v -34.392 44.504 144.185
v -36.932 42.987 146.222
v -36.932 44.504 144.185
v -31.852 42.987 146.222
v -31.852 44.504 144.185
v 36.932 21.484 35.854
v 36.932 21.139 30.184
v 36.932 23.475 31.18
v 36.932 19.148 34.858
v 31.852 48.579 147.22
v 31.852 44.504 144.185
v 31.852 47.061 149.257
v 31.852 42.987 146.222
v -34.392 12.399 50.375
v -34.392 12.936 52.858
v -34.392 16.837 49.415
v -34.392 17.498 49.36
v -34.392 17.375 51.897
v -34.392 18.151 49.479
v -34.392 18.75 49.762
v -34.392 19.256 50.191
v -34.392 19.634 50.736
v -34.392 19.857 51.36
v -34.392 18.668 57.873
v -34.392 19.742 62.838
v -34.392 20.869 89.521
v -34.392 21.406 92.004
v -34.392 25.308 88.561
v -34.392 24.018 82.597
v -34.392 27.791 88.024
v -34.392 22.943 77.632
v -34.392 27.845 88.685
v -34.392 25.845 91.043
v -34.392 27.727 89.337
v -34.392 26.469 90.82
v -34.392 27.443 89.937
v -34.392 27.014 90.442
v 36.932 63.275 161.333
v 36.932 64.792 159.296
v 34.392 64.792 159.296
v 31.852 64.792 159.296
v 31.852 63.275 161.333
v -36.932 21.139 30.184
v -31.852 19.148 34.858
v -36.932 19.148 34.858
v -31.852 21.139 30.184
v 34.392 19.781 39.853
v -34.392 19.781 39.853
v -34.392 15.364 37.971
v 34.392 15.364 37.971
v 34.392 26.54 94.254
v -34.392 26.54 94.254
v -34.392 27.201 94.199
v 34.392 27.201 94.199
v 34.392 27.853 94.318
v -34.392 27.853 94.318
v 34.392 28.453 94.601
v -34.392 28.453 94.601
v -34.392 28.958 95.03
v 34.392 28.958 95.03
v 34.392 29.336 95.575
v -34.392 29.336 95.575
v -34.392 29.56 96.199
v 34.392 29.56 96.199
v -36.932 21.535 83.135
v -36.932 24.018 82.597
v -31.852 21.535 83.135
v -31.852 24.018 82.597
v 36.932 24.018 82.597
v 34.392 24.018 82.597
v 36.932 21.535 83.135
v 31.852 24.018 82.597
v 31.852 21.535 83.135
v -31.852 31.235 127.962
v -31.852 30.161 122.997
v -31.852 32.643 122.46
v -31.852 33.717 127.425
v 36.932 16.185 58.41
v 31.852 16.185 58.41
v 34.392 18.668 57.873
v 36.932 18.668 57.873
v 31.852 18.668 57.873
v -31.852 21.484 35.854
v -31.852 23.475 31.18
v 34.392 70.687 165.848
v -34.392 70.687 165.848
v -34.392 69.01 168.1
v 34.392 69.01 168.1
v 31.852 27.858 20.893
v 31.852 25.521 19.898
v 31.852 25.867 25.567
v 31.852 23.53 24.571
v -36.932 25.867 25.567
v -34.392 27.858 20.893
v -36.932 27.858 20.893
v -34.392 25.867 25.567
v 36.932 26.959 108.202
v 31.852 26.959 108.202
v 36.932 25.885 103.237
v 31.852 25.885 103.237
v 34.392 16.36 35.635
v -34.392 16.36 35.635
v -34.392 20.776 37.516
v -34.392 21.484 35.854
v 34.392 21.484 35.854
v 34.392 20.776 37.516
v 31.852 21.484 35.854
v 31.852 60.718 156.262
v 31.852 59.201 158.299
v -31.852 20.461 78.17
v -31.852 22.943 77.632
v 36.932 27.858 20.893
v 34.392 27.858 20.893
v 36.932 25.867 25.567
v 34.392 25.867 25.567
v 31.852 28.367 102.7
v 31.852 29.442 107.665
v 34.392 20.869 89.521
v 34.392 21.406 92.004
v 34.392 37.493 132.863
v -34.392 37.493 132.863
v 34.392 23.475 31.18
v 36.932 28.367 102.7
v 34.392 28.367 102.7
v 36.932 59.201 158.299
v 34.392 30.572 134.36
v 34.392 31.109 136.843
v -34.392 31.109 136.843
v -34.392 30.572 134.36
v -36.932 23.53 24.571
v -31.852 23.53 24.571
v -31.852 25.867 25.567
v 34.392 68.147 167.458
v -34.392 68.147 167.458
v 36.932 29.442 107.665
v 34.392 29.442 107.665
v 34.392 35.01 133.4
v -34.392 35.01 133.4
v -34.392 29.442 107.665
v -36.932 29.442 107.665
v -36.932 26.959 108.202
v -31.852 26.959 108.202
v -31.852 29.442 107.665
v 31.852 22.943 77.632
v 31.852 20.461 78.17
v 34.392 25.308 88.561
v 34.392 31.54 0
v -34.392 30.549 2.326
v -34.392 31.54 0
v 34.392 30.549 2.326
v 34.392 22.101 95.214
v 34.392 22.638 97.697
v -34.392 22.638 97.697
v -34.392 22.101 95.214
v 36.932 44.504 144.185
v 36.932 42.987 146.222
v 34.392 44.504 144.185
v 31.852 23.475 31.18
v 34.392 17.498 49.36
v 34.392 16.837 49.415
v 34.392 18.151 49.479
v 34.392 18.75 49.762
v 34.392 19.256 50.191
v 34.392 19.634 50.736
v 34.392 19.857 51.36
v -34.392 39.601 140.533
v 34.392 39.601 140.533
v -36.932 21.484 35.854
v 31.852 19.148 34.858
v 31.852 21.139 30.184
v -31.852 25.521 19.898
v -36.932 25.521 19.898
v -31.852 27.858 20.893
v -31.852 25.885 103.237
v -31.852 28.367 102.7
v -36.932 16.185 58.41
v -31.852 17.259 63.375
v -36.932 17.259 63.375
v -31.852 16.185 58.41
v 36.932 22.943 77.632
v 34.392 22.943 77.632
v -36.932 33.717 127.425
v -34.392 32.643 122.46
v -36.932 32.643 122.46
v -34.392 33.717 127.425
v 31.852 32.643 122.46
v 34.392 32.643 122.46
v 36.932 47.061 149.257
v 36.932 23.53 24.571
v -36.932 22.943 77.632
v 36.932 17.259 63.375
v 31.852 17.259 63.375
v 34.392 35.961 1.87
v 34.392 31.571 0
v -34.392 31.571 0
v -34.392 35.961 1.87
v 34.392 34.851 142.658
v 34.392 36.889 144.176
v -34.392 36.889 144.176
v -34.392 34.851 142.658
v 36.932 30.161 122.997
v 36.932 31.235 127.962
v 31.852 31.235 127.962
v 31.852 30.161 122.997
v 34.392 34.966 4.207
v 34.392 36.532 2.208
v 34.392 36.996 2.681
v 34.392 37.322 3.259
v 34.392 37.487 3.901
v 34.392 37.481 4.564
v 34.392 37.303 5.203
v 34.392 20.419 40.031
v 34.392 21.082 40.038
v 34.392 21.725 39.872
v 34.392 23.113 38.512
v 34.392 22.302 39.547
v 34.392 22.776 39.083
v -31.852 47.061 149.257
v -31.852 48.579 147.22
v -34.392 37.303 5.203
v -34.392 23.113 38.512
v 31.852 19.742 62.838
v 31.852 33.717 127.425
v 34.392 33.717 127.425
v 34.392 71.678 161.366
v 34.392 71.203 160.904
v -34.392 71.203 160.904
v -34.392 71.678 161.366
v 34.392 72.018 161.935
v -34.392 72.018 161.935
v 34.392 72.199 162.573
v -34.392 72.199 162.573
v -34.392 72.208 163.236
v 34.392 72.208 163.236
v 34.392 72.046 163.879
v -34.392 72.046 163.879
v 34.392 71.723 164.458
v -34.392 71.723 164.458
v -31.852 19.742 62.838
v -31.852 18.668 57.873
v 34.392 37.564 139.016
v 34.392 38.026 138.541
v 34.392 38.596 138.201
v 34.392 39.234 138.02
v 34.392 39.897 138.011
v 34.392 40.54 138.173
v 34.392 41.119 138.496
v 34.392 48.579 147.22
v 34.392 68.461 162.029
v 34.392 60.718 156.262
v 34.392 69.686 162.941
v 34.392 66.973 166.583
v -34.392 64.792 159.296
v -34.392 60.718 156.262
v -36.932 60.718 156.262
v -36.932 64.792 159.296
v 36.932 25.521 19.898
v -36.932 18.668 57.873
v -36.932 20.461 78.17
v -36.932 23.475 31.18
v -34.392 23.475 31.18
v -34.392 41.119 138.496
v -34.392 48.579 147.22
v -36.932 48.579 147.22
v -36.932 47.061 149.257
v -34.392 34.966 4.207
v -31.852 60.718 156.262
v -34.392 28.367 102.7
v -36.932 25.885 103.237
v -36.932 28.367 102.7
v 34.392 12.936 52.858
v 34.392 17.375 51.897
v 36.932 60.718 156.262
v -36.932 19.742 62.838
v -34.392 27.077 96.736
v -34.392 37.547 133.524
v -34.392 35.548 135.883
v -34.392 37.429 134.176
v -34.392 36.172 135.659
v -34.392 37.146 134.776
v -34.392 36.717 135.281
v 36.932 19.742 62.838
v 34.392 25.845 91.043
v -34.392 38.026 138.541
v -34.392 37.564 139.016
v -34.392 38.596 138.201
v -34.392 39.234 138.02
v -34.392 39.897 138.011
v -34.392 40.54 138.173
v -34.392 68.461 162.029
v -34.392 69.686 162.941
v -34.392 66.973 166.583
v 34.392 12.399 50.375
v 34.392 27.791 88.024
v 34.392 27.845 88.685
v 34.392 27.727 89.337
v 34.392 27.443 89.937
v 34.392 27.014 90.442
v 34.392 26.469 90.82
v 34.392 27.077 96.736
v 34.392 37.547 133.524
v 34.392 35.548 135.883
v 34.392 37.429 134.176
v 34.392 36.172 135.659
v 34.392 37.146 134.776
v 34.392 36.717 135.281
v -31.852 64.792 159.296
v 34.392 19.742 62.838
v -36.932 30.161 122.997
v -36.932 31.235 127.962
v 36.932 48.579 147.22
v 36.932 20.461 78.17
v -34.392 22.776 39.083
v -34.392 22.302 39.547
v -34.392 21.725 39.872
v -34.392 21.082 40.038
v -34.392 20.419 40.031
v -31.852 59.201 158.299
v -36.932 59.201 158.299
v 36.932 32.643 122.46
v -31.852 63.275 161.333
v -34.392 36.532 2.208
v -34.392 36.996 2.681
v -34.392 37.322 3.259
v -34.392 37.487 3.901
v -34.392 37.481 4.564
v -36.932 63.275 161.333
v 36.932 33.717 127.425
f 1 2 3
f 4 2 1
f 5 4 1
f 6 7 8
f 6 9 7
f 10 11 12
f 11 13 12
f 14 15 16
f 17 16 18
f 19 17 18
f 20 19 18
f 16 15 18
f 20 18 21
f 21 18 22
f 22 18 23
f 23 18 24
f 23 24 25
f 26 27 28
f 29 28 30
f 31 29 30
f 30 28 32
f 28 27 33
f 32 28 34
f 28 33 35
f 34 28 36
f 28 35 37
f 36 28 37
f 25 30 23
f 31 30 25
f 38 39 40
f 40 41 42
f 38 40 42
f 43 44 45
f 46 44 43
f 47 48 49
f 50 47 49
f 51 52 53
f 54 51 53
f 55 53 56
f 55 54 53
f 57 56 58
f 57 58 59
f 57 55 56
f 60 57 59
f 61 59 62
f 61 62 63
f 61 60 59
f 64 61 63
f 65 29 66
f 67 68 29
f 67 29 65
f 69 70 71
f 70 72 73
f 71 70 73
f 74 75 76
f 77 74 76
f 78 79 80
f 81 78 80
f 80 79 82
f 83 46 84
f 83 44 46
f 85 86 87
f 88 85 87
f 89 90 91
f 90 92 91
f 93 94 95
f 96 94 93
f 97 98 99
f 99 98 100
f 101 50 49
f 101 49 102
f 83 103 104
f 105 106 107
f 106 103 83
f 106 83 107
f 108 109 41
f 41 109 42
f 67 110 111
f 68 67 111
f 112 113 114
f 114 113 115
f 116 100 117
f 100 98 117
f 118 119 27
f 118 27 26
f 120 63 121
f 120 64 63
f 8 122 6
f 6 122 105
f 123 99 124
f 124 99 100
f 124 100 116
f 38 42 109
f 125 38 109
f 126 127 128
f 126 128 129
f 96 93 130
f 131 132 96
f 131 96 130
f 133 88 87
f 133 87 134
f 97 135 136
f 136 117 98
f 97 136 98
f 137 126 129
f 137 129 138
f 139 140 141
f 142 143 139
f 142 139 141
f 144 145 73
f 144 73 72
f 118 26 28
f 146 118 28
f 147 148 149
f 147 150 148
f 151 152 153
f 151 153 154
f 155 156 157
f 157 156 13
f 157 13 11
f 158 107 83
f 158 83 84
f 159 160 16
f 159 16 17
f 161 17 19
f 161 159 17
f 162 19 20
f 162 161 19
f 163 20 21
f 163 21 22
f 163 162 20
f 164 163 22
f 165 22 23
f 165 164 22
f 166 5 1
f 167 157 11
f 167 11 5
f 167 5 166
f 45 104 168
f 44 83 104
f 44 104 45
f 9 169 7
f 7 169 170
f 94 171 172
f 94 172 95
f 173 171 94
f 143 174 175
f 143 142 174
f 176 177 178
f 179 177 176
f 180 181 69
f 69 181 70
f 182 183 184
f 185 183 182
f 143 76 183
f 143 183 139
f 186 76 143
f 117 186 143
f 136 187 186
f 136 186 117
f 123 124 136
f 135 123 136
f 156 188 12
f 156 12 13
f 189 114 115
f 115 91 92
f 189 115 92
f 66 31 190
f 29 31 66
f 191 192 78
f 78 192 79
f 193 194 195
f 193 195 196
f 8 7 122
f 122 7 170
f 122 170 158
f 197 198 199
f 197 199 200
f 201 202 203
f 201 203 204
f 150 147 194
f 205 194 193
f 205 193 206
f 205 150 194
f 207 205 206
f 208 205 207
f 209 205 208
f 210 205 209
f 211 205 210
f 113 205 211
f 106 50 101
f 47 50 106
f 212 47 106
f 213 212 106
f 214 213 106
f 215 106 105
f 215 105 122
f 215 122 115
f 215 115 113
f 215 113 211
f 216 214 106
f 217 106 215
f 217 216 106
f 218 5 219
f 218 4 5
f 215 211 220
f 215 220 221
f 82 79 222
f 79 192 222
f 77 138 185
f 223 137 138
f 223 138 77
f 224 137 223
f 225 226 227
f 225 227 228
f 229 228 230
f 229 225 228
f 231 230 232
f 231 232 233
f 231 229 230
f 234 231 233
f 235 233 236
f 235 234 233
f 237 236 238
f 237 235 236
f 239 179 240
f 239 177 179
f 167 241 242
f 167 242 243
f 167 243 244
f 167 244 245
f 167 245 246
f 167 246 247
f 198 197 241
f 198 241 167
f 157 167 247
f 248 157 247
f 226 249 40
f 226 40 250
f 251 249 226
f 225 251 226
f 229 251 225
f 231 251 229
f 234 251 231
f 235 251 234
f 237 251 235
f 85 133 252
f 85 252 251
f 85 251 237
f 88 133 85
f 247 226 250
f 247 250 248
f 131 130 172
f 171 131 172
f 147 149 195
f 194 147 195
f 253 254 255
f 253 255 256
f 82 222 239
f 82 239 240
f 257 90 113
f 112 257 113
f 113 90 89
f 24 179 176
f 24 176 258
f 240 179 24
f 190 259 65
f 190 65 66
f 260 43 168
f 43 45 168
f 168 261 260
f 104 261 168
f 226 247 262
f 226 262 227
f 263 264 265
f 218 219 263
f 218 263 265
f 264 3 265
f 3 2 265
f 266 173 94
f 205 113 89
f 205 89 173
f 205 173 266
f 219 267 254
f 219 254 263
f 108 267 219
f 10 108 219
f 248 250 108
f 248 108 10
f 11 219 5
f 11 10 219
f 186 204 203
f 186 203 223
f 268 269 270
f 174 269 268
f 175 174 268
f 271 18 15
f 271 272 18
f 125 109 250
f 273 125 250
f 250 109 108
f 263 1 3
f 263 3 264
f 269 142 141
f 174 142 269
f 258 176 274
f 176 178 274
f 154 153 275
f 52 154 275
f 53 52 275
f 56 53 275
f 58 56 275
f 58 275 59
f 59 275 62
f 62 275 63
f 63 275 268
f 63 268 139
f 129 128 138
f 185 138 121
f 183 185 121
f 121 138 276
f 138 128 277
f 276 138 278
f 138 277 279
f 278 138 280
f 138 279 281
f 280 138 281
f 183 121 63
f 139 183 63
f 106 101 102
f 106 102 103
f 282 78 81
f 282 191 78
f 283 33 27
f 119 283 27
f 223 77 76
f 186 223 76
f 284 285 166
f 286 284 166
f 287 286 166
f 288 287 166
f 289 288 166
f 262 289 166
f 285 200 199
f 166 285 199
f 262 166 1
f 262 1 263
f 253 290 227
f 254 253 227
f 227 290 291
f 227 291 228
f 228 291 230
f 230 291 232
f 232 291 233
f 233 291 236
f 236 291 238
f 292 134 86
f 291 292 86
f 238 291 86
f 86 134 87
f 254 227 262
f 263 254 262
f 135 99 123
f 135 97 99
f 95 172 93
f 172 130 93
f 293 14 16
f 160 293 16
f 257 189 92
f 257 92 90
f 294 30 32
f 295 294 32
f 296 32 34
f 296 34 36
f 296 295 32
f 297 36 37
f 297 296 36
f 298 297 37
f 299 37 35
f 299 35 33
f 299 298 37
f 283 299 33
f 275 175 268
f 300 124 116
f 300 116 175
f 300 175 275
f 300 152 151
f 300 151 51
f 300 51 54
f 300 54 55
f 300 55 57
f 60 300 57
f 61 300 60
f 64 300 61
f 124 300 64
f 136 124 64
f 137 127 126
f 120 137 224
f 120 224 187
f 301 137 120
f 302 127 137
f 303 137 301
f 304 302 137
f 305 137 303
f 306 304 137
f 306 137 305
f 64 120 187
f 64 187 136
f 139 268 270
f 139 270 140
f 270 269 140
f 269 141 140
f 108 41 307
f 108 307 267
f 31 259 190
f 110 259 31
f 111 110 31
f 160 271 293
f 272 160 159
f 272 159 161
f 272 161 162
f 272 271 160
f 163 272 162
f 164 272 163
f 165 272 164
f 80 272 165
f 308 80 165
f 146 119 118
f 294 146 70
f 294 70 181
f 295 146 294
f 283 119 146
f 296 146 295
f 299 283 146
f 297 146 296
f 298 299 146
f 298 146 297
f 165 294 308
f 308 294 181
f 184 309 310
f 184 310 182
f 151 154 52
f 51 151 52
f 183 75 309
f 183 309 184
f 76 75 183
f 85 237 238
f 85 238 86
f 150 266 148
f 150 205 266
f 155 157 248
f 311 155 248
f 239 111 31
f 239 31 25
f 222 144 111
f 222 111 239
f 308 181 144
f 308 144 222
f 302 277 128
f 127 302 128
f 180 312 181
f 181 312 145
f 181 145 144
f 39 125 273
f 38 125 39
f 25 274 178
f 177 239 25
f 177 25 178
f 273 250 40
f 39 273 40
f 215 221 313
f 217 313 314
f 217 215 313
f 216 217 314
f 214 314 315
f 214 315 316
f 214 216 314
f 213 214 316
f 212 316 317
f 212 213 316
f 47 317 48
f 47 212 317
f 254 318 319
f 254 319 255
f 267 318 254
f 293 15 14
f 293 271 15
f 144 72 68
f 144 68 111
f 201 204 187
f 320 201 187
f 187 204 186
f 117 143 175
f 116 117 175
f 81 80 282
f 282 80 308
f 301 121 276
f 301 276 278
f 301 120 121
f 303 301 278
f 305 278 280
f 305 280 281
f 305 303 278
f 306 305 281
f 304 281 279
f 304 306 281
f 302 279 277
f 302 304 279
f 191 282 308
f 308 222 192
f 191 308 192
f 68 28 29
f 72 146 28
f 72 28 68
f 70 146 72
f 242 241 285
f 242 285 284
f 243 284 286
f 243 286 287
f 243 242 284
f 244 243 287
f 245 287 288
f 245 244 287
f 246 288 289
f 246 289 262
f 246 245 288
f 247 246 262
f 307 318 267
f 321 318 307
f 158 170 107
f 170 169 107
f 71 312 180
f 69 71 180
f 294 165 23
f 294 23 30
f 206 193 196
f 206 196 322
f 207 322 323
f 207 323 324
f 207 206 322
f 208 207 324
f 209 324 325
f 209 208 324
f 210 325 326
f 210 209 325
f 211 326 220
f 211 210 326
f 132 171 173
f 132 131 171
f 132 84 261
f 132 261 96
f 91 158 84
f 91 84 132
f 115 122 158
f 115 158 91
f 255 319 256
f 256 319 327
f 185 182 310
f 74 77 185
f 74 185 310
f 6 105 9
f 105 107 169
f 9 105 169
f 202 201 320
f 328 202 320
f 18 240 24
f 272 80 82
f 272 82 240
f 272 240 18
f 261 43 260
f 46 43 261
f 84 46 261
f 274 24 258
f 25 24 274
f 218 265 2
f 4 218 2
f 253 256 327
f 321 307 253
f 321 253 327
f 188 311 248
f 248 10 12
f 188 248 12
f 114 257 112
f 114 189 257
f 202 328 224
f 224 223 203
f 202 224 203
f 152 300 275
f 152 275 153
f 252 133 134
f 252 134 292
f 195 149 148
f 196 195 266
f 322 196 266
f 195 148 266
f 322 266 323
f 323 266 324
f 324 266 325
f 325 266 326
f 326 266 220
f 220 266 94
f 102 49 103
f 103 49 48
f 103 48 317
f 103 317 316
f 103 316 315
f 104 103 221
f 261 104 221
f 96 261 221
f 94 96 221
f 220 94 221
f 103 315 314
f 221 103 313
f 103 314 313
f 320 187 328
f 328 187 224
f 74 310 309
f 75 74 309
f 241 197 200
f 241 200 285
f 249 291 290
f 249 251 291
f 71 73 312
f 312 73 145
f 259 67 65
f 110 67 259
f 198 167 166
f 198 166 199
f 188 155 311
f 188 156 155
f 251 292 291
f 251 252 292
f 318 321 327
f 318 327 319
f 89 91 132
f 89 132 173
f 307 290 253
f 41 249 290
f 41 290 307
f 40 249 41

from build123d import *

# Parameters (mm, degrees)
F1_DEPTH = 34.3916
F2_START = 31.8516
F2_DEPTH = 5.08
F3_START = -31.8516
F3_DEPTH = 5.08


with BuildPart() as f1:
    # F0 (on Right) → F1 (new body, symmetric)
    with BuildSketch(Plane.YZ):
        with BuildLine():
            Line((35.5475592049, 135.882533211), (31.1087493632, 136.8430153909))
            Line((31.1087493632, 136.8430153909), (30.5715689534, 134.3604688743))
            Line((30.5715689534, 134.3604688743), (35.010378795, 133.3999866944))
            Line((35.010378795, 133.3999866944), (33.7174203827, 127.4246582133))
            Line((33.7174203827, 127.4246582133), (32.643059563, 122.45956518))
            Line((32.643059563, 122.45956518), (29.4417548033, 107.6649303911))
            Line((29.4417548033, 107.6649303911), (28.3673939836, 102.6998373579))
            Line((28.3673939836, 102.6998373579), (27.077006821, 96.7363917505))
            Line((27.077006821, 96.7363917505), (22.6381969794, 97.6968739305))
            Line((22.6381969794, 97.6968739305), (22.1010165695, 95.2143274138))
            Line((22.1010165695, 95.2143274138), (26.5398264112, 94.2538452339))
            ThreePointArc((26.5398264112, 94.2538452339), (28.452588387, 94.6011223635), (29.5595533377, 96.1992113407))
            Line((29.5595533377, 96.1992113407), (37.4929253116, 132.8628062845))
            ThreePointArc((37.4929253116, 132.8628062845), (37.1456481821, 134.7755682604), (35.5475592049, 135.882533211))
        make_face()
    extrude(amount=F1_DEPTH, both=True)

    # F0 (on Right) → F2, piece 2 (join)
    with BuildSketch(Plane.YZ.offset(F2_START)):
        Polygon((32.643059563, 122.45956518), (33.7174203827, 127.4246582133), (31.2348738661, 127.9618386231), (30.1605130463, 122.9967455899), align=None)
        Polygon((25.884847467, 103.2370177677), (28.3673939836, 102.6998373579), (29.4417548033, 107.6649303911), (26.9592082867, 108.202110801), align=None)
    extrude(amount=F2_DEPTH)

    # F0 (on Right) → F3, piece 2 (join)
    with BuildSketch(Plane.YZ.offset(F3_START)):
        Polygon((32.643059563, 122.45956518), (33.7174203827, 127.4246582133), (31.2348738661, 127.9618386231), (30.1605130463, 122.9967455899), align=None)
        Polygon((25.884847467, 103.2370177677), (28.3673939836, 102.6998373579), (29.4417548033, 107.6649303911), (26.9592082867, 108.202110801), align=None)
    extrude(amount=-F3_DEPTH)


with BuildPart() as f1b:
    # F0 (on Right) → F1, piece 2 (new body, symmetric)
    with BuildSketch(Plane.YZ):
        with BuildLine():
            Line((12.9357939022, 52.8578095868), (12.3986134924, 50.3752630702))
            Line((12.3986134924, 50.3752630702), (16.837423334, 49.4147808903))
            ThreePointArc((16.837423334, 49.4147808903), (18.7501853099, 49.7620580199), (19.8571502605, 51.3601469971))
            Line((19.8571502605, 51.3601469971), (27.7905222345, 88.0237419409))
            ThreePointArc((27.7905222345, 88.0237419409), (27.4432451049, 89.9365039168), (25.8451561277, 91.0434688674))
            Line((25.8451561277, 91.0434688674), (21.4063462861, 92.0039510473))
            Line((21.4063462861, 92.0039510473), (20.8691658762, 89.5214045307))
            Line((20.8691658762, 89.5214045307), (25.3079757178, 88.5609223508))
            Line((25.3079757178, 88.5609223508), (24.0175885553, 82.5974767434))
            Line((24.0175885553, 82.5974767434), (22.9432277355, 77.6323837102))
            Line((22.9432277355, 77.6323837102), (19.7419229759, 62.8377489213))
            Line((19.7419229759, 62.8377489213), (18.6675621562, 57.872655888))
            Line((18.6675621562, 57.872655888), (17.3746037439, 51.8973274069))
            Line((17.3746037439, 51.8973274069), (12.9357939022, 52.8578095868))
        make_face()
    extrude(amount=F1_DEPTH, both=True)

    # F0 (on Right) → F2, piece 3 (join)
    with BuildSketch(Plane.YZ.offset(F2_START)):
        Polygon((16.1850156395, 58.4098362979), (18.6675621562, 57.872655888), (19.7419229759, 62.8377489213), (17.2593764593, 63.3749293312), align=None)
        Polygon((22.9432277355, 77.6323837102), (24.0175885553, 82.5974767434), (21.5350420386, 83.1346571533), (20.4606812189, 78.16956412), align=None)
    extrude(amount=F2_DEPTH)

    # F0 (on Right) → F3, piece 3 (join)
    with BuildSketch(Plane.YZ.offset(F3_START)):
        Polygon((22.9432277355, 77.6323837102), (24.0175885553, 82.5974767434), (21.5350420386, 83.1346571533), (20.4606812189, 78.16956412), align=None)
        Polygon((16.1850156395, 58.4098362979), (18.6675621562, 57.872655888), (19.7419229759, 62.8377489213), (17.2593764593, 63.3749293312), align=None)
    extrude(amount=-F3_DEPTH)


with BuildPart() as f1c:
    # F0 (on Right) → F1, piece 3 (new body, symmetric)
    with BuildSketch(Plane.YZ):
        with BuildLine():
            Line((30.5493542935, 2.3257501254), (31.5401391658, 0))
            Line((31.5401391658, 0), (31.5707651968, 0))
            Line((31.5707651968, 0), (35.9613821509, 1.8704317419))
            ThreePointArc((35.9613821509, 1.8704317419), (37.3221722578, 3.2587797047), (37.302685911, 5.2027138762))
            Line((37.302685911, 5.2027138762), (23.1128714591, 38.5116224639))
            ThreePointArc((23.1128714591, 38.5116224639), (21.7245234962, 39.8724125708), (19.7805893247, 39.852926224))
            Line((19.7805893247, 39.852926224), (15.3640506544, 37.9714516603))
            Line((15.3640506544, 37.9714516603), (16.3595398415, 35.6346587131))
            Line((16.3595398415, 35.6346587131), (20.7760785118, 37.5161332768))
            Line((20.7760785118, 37.5161332768), (21.4843682503, 35.8535070154))
            Line((21.4843682503, 35.8535070154), (23.4753466245, 31.1799211209))
            Line((23.4753466245, 31.1799211209), (25.8665425285, 25.5668719827))
            Line((25.8665425285, 25.5668719827), (27.8575209028, 20.8932860882))
            Line((27.8575209028, 20.8932860882), (34.9658929638, 4.2072246891))
            Line((34.9658929638, 4.2072246891), (30.5493542935, 2.3257501254))
        make_face()
    extrude(amount=F1_DEPTH, both=True)

    # F0 (on Right) → F2, piece 4 (join)
    with BuildSketch(Plane.YZ.offset(F2_START)):
        Polygon((21.1385536773, 30.1844319338), (23.4753466245, 31.1799211209), (21.4843682503, 35.8535070154), (19.147575303, 34.8580178283), align=None)
        Polygon((25.5207279555, 19.8977969011), (27.8575209028, 20.8932860882), (25.8665425285, 25.5668719827), (23.5297495813, 24.5713827956), align=None)
    extrude(amount=F2_DEPTH)

    # F0 (on Right) → F3, piece 4 (join)
    with BuildSketch(Plane.YZ.offset(F3_START)):
        Polygon((25.5207279555, 19.8977969011), (27.8575209028, 20.8932860882), (25.8665425285, 25.5668719827), (23.5297495813, 24.5713827956), align=None)
        Polygon((21.1385536773, 30.1844319338), (23.4753466245, 31.1799211209), (21.4843682503, 35.8535070154), (19.147575303, 34.8580178283), align=None)
    extrude(amount=-F3_DEPTH)


with BuildPart() as f1d:
    # F0 (on Right) → F1, piece 4 (new body, symmetric)
    with BuildSketch(Plane.YZ):
        with BuildLine():
            ThreePointArc((70.6874244764, 164.5491375), (70.0510915867, 162.8675752701), (68.4609272063, 162.0285589874))
            Line((68.4609272063, 162.0285589874), (64.7923923036, 159.296159841))
            Line((64.7923923036, 159.296159841), (60.7182854085, 156.2616824549))
            Line((60.7182854085, 156.2616824549), (48.5785484084, 147.2197602993))
            Line((48.5785484084, 147.2197602993), (44.5044415132, 144.1852829132))
            Line((44.5044415132, 144.1852829132), (39.6013859607, 140.5333877666))
            Line((39.6013859607, 140.5333877666), (36.8885529895, 144.1756530093))
            Line((36.8885529895, 144.1756530093), (34.8514995419, 142.6584143163))
            Line((34.8514995419, 142.6584143163), (37.5643325131, 139.0161490735))
            ThreePointArc((37.5643325131, 139.0161490735), (39.2338214228, 138.0201236916), (41.1186246537, 138.496334319))
            Line((41.1186246537, 138.496334319), (71.2029360576, 160.9037391763))
            ThreePointArc((71.2029360576, 160.9037391763), (72.1989614395, 162.573228086), (71.7227508122, 164.4580313169))
            Line((71.7227508122, 164.4580313169), (70.6874244764, 165.8480664454))
            Line((70.6874244764, 165.8480664454), (70.6874244764, 164.5491375))
        make_face()
        with BuildLine():
            Line((69.6856973646, 162.9407926238), (68.4609272063, 162.0285589874))
            ThreePointArc((68.4609272063, 162.0285589874), (70.0510915867, 162.8675752701), (70.6874244764, 164.5491375))
            Line((70.6874244764, 164.5491375), (70.6874244764, 165.8480664454))
            Line((70.6874244764, 165.8480664454), (69.009917841, 168.1002965597))
            Line((69.009917841, 168.1002965597), (68.1474244764, 167.4578940214))
            Line((68.1474244764, 167.4578940214), (68.1474244764, 165.0060867035))
            Line((68.1474244764, 165.0060867035), (69.6856973646, 162.9407926238))
        make_face()
        Polygon((68.1474244764, 165.0060867035), (68.1474244764, 167.4578940214), (66.9728643934, 166.5830578666), align=None)
    extrude(amount=F1_DEPTH, both=True)

    # F0 (on Right) → F2 (join)
    with BuildSketch(Plane.YZ.offset(F2_START)):
        Polygon((60.7182854085, 156.2616824549), (64.7923923036, 159.296159841), (63.2751536106, 161.3332132886), (59.2010467154, 158.2987359025), align=None)
        Polygon((44.5044415132, 144.1852829132), (48.5785484084, 147.2197602993), (47.0613097153, 149.2568137468), (42.9872028202, 146.2223363607), align=None)
    extrude(amount=F2_DEPTH)

    # F0 (on Right) → F3 (join)
    with BuildSketch(Plane.YZ.offset(F3_START)):
        Polygon((60.7182854085, 156.2616824549), (64.7923923036, 159.296159841), (63.2751536106, 161.3332132886), (59.2010467154, 158.2987359025), align=None)
        Polygon((44.5044415132, 144.1852829132), (48.5785484084, 147.2197602993), (47.0613097153, 149.2568137468), (42.9872028202, 146.2223363607), align=None)
    extrude(amount=-F3_DEPTH)


solid = Compound([f1.part, f1b.part, f1c.part, f1d.part])
